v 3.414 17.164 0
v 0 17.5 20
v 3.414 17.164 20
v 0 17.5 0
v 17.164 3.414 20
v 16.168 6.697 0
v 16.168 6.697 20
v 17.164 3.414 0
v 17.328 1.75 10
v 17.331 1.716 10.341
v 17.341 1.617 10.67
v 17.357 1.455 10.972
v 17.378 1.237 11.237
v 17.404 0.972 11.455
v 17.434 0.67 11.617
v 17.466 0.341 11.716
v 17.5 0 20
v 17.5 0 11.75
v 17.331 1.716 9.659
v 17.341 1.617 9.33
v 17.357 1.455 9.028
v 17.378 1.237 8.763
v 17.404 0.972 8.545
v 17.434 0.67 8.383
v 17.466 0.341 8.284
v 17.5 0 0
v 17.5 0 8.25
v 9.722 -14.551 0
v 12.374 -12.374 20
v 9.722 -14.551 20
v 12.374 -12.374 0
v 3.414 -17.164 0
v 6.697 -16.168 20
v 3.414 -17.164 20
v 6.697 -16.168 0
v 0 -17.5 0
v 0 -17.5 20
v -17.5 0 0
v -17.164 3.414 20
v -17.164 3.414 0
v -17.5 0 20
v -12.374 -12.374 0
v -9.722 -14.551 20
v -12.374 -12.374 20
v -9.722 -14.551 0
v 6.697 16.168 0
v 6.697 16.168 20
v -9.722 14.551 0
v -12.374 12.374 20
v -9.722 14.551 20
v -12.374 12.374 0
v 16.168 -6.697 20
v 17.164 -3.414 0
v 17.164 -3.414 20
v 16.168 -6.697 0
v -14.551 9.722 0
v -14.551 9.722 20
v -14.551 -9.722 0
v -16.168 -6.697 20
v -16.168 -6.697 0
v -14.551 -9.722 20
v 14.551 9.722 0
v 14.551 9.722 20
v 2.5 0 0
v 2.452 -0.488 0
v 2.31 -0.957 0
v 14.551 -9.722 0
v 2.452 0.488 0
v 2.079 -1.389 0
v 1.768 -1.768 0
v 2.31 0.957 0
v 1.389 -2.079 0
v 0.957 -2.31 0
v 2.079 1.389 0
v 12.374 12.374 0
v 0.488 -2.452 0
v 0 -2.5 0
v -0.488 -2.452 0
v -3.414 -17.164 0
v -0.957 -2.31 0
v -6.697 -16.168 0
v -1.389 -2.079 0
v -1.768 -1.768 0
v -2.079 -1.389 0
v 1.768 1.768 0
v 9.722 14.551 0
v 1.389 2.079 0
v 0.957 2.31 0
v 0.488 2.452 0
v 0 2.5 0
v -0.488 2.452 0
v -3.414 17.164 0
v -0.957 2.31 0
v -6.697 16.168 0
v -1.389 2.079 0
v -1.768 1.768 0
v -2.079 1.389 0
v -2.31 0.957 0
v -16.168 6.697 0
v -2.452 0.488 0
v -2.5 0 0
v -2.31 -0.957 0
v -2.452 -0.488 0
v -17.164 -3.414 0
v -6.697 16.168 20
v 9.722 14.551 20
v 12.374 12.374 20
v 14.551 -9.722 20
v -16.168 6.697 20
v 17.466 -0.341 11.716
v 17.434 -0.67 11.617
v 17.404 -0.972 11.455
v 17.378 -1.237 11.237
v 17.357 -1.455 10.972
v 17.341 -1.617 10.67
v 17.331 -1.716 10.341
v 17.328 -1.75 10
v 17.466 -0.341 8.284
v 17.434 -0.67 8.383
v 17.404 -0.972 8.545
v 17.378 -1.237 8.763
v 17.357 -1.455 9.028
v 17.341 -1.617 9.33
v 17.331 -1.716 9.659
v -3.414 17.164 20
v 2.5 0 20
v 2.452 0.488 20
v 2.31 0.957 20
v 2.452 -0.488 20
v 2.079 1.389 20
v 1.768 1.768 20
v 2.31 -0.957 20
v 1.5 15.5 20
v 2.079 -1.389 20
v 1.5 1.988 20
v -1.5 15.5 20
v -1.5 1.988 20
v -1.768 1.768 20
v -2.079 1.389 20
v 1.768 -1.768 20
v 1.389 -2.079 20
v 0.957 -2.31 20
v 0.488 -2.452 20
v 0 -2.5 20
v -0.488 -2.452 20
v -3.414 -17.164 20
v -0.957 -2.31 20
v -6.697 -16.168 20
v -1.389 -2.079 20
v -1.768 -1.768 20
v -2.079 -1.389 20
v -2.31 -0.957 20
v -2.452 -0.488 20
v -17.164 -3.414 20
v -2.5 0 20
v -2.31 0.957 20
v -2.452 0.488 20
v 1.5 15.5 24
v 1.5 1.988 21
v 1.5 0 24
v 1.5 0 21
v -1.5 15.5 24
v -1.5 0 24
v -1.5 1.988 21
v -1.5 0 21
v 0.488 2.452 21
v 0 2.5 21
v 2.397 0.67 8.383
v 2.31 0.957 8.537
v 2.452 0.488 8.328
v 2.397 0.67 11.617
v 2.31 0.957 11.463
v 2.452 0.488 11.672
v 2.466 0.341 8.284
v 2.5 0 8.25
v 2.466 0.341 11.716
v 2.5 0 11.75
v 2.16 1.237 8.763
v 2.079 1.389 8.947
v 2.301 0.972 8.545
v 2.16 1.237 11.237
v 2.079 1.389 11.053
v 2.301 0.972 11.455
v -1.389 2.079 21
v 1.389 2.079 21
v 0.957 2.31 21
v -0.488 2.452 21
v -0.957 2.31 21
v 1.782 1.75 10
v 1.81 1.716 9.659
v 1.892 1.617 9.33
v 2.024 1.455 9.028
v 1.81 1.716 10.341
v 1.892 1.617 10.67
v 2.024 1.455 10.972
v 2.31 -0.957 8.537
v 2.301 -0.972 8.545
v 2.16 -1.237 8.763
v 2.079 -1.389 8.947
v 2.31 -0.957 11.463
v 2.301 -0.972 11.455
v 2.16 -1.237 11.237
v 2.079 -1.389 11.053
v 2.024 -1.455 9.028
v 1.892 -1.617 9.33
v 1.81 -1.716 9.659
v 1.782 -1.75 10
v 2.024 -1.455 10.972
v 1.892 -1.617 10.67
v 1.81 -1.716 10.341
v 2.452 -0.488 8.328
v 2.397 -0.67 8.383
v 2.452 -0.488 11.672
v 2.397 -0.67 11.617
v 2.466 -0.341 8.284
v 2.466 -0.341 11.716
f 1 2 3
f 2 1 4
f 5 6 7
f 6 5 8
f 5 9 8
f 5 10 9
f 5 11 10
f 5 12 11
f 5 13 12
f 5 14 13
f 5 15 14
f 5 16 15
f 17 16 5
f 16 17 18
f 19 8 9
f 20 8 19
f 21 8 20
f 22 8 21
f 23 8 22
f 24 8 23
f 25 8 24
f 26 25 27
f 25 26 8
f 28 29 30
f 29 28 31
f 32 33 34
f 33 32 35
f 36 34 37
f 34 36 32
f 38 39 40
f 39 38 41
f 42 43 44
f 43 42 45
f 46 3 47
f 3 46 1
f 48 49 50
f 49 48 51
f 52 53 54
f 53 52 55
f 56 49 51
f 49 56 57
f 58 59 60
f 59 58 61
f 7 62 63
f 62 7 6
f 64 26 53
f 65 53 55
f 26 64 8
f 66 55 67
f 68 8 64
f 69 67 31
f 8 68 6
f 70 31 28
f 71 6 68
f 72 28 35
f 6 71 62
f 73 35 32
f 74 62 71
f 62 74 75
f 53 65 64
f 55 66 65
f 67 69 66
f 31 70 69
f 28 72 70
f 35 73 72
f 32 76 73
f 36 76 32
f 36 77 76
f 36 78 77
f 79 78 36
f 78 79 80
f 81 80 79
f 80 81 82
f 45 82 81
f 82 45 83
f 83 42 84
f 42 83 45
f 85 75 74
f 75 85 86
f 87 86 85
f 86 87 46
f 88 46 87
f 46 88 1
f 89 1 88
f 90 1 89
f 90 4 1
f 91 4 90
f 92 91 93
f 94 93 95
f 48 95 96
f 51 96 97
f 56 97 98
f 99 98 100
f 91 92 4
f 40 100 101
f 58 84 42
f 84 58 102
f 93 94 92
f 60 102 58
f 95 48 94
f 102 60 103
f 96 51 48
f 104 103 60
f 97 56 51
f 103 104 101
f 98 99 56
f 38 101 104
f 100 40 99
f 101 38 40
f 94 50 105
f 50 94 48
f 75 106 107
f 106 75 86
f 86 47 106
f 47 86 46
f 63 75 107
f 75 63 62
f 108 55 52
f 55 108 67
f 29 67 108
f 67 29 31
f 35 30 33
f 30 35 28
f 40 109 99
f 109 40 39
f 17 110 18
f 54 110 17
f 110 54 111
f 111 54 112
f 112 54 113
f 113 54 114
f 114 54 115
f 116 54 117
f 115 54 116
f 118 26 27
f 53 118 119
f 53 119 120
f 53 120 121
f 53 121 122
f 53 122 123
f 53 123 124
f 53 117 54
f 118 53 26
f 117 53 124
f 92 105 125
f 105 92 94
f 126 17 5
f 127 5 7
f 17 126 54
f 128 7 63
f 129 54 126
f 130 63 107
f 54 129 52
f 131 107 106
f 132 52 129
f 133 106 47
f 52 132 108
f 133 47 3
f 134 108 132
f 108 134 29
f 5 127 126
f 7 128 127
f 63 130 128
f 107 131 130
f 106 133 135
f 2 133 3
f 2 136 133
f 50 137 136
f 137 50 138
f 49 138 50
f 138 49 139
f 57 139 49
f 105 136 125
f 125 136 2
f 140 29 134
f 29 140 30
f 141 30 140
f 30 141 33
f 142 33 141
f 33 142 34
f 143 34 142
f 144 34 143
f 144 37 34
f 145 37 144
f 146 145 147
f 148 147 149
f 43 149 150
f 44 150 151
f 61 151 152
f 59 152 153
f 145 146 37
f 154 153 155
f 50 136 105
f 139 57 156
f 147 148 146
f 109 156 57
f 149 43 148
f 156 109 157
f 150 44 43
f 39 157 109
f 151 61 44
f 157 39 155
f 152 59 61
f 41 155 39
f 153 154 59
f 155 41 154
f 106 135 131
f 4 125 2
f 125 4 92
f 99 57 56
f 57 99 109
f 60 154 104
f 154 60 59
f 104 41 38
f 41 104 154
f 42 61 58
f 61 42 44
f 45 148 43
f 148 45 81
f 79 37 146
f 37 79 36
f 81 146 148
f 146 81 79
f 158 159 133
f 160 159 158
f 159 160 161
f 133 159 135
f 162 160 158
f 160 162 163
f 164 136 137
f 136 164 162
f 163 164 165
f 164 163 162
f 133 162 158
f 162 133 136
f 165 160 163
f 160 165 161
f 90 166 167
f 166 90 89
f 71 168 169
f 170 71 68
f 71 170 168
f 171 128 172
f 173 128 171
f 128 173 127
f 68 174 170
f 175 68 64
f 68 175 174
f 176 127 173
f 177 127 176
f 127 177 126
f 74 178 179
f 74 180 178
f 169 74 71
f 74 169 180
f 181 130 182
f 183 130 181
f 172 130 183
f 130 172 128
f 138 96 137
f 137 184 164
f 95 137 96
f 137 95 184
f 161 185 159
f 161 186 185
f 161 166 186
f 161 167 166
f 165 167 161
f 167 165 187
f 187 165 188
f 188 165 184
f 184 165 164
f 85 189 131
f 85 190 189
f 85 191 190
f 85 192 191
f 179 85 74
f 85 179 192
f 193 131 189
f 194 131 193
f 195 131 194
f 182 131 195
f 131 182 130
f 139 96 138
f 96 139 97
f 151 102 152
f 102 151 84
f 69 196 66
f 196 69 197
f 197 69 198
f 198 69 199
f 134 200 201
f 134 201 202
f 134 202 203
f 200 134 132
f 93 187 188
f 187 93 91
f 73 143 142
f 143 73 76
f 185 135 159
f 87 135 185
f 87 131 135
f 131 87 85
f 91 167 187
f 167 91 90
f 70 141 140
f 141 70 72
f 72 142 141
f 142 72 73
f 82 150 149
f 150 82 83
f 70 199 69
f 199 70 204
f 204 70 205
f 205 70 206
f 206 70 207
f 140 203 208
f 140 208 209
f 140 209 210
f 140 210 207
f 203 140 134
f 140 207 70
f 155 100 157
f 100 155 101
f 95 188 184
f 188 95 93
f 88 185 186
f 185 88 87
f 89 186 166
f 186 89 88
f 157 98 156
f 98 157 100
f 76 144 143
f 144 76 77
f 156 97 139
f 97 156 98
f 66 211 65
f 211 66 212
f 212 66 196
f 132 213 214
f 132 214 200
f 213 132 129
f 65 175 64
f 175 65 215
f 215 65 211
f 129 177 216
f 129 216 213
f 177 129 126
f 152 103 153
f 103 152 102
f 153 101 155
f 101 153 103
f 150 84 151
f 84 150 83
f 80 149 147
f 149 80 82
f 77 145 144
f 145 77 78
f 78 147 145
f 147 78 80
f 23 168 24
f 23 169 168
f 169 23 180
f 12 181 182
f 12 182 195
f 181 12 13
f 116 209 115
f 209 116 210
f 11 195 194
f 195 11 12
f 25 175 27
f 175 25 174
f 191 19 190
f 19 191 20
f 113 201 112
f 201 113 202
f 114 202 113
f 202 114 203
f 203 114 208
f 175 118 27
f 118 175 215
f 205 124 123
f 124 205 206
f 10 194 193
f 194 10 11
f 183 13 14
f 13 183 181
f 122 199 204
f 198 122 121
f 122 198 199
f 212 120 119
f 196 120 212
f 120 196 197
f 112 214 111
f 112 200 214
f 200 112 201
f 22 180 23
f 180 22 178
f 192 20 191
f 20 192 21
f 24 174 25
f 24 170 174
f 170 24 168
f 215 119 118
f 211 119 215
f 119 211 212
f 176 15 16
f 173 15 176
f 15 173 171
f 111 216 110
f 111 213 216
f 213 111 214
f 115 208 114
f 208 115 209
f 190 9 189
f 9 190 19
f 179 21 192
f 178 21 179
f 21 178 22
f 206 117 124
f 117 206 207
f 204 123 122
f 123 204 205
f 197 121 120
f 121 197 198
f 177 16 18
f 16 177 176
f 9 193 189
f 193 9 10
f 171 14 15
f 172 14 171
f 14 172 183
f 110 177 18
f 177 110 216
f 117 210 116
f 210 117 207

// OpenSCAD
$fn = 32;

// ----------------------------------------------------------------------
// Control knob: pointer knob
// ----------------------------------------------------------------------

// --- parameters (mm) ---
rib_w = 3;                // pointer rib width
rib_h = 5;                // pointer rib height
knob_d = 35;              // knob body diameter
knob_h = 20;              // knob body height
bore_d = 5;               // shaft bore diameter
set_d = 3.5;              // set screw bore diameter

rib_poke = rib_h - 1;  // rib height above the top
total_h = knob_h + rib_h - 1;  // overall height

difference() {
  union() {
    cylinder(h = knob_h, d = knob_d);
    translate([-rib_w / 2, 0, knob_h - 1])
      cube([rib_w, knob_d / 2 - 2, rib_h]);
  }
  translate([0, 0, -1]) cylinder(h = knob_h + 2, d = bore_d);
  translate([-1, 0, knob_h / 2]) rotate([0, 90, 0])
    cylinder(h = knob_d / 2 + bore_d / 2 + 2, d = set_d);}
